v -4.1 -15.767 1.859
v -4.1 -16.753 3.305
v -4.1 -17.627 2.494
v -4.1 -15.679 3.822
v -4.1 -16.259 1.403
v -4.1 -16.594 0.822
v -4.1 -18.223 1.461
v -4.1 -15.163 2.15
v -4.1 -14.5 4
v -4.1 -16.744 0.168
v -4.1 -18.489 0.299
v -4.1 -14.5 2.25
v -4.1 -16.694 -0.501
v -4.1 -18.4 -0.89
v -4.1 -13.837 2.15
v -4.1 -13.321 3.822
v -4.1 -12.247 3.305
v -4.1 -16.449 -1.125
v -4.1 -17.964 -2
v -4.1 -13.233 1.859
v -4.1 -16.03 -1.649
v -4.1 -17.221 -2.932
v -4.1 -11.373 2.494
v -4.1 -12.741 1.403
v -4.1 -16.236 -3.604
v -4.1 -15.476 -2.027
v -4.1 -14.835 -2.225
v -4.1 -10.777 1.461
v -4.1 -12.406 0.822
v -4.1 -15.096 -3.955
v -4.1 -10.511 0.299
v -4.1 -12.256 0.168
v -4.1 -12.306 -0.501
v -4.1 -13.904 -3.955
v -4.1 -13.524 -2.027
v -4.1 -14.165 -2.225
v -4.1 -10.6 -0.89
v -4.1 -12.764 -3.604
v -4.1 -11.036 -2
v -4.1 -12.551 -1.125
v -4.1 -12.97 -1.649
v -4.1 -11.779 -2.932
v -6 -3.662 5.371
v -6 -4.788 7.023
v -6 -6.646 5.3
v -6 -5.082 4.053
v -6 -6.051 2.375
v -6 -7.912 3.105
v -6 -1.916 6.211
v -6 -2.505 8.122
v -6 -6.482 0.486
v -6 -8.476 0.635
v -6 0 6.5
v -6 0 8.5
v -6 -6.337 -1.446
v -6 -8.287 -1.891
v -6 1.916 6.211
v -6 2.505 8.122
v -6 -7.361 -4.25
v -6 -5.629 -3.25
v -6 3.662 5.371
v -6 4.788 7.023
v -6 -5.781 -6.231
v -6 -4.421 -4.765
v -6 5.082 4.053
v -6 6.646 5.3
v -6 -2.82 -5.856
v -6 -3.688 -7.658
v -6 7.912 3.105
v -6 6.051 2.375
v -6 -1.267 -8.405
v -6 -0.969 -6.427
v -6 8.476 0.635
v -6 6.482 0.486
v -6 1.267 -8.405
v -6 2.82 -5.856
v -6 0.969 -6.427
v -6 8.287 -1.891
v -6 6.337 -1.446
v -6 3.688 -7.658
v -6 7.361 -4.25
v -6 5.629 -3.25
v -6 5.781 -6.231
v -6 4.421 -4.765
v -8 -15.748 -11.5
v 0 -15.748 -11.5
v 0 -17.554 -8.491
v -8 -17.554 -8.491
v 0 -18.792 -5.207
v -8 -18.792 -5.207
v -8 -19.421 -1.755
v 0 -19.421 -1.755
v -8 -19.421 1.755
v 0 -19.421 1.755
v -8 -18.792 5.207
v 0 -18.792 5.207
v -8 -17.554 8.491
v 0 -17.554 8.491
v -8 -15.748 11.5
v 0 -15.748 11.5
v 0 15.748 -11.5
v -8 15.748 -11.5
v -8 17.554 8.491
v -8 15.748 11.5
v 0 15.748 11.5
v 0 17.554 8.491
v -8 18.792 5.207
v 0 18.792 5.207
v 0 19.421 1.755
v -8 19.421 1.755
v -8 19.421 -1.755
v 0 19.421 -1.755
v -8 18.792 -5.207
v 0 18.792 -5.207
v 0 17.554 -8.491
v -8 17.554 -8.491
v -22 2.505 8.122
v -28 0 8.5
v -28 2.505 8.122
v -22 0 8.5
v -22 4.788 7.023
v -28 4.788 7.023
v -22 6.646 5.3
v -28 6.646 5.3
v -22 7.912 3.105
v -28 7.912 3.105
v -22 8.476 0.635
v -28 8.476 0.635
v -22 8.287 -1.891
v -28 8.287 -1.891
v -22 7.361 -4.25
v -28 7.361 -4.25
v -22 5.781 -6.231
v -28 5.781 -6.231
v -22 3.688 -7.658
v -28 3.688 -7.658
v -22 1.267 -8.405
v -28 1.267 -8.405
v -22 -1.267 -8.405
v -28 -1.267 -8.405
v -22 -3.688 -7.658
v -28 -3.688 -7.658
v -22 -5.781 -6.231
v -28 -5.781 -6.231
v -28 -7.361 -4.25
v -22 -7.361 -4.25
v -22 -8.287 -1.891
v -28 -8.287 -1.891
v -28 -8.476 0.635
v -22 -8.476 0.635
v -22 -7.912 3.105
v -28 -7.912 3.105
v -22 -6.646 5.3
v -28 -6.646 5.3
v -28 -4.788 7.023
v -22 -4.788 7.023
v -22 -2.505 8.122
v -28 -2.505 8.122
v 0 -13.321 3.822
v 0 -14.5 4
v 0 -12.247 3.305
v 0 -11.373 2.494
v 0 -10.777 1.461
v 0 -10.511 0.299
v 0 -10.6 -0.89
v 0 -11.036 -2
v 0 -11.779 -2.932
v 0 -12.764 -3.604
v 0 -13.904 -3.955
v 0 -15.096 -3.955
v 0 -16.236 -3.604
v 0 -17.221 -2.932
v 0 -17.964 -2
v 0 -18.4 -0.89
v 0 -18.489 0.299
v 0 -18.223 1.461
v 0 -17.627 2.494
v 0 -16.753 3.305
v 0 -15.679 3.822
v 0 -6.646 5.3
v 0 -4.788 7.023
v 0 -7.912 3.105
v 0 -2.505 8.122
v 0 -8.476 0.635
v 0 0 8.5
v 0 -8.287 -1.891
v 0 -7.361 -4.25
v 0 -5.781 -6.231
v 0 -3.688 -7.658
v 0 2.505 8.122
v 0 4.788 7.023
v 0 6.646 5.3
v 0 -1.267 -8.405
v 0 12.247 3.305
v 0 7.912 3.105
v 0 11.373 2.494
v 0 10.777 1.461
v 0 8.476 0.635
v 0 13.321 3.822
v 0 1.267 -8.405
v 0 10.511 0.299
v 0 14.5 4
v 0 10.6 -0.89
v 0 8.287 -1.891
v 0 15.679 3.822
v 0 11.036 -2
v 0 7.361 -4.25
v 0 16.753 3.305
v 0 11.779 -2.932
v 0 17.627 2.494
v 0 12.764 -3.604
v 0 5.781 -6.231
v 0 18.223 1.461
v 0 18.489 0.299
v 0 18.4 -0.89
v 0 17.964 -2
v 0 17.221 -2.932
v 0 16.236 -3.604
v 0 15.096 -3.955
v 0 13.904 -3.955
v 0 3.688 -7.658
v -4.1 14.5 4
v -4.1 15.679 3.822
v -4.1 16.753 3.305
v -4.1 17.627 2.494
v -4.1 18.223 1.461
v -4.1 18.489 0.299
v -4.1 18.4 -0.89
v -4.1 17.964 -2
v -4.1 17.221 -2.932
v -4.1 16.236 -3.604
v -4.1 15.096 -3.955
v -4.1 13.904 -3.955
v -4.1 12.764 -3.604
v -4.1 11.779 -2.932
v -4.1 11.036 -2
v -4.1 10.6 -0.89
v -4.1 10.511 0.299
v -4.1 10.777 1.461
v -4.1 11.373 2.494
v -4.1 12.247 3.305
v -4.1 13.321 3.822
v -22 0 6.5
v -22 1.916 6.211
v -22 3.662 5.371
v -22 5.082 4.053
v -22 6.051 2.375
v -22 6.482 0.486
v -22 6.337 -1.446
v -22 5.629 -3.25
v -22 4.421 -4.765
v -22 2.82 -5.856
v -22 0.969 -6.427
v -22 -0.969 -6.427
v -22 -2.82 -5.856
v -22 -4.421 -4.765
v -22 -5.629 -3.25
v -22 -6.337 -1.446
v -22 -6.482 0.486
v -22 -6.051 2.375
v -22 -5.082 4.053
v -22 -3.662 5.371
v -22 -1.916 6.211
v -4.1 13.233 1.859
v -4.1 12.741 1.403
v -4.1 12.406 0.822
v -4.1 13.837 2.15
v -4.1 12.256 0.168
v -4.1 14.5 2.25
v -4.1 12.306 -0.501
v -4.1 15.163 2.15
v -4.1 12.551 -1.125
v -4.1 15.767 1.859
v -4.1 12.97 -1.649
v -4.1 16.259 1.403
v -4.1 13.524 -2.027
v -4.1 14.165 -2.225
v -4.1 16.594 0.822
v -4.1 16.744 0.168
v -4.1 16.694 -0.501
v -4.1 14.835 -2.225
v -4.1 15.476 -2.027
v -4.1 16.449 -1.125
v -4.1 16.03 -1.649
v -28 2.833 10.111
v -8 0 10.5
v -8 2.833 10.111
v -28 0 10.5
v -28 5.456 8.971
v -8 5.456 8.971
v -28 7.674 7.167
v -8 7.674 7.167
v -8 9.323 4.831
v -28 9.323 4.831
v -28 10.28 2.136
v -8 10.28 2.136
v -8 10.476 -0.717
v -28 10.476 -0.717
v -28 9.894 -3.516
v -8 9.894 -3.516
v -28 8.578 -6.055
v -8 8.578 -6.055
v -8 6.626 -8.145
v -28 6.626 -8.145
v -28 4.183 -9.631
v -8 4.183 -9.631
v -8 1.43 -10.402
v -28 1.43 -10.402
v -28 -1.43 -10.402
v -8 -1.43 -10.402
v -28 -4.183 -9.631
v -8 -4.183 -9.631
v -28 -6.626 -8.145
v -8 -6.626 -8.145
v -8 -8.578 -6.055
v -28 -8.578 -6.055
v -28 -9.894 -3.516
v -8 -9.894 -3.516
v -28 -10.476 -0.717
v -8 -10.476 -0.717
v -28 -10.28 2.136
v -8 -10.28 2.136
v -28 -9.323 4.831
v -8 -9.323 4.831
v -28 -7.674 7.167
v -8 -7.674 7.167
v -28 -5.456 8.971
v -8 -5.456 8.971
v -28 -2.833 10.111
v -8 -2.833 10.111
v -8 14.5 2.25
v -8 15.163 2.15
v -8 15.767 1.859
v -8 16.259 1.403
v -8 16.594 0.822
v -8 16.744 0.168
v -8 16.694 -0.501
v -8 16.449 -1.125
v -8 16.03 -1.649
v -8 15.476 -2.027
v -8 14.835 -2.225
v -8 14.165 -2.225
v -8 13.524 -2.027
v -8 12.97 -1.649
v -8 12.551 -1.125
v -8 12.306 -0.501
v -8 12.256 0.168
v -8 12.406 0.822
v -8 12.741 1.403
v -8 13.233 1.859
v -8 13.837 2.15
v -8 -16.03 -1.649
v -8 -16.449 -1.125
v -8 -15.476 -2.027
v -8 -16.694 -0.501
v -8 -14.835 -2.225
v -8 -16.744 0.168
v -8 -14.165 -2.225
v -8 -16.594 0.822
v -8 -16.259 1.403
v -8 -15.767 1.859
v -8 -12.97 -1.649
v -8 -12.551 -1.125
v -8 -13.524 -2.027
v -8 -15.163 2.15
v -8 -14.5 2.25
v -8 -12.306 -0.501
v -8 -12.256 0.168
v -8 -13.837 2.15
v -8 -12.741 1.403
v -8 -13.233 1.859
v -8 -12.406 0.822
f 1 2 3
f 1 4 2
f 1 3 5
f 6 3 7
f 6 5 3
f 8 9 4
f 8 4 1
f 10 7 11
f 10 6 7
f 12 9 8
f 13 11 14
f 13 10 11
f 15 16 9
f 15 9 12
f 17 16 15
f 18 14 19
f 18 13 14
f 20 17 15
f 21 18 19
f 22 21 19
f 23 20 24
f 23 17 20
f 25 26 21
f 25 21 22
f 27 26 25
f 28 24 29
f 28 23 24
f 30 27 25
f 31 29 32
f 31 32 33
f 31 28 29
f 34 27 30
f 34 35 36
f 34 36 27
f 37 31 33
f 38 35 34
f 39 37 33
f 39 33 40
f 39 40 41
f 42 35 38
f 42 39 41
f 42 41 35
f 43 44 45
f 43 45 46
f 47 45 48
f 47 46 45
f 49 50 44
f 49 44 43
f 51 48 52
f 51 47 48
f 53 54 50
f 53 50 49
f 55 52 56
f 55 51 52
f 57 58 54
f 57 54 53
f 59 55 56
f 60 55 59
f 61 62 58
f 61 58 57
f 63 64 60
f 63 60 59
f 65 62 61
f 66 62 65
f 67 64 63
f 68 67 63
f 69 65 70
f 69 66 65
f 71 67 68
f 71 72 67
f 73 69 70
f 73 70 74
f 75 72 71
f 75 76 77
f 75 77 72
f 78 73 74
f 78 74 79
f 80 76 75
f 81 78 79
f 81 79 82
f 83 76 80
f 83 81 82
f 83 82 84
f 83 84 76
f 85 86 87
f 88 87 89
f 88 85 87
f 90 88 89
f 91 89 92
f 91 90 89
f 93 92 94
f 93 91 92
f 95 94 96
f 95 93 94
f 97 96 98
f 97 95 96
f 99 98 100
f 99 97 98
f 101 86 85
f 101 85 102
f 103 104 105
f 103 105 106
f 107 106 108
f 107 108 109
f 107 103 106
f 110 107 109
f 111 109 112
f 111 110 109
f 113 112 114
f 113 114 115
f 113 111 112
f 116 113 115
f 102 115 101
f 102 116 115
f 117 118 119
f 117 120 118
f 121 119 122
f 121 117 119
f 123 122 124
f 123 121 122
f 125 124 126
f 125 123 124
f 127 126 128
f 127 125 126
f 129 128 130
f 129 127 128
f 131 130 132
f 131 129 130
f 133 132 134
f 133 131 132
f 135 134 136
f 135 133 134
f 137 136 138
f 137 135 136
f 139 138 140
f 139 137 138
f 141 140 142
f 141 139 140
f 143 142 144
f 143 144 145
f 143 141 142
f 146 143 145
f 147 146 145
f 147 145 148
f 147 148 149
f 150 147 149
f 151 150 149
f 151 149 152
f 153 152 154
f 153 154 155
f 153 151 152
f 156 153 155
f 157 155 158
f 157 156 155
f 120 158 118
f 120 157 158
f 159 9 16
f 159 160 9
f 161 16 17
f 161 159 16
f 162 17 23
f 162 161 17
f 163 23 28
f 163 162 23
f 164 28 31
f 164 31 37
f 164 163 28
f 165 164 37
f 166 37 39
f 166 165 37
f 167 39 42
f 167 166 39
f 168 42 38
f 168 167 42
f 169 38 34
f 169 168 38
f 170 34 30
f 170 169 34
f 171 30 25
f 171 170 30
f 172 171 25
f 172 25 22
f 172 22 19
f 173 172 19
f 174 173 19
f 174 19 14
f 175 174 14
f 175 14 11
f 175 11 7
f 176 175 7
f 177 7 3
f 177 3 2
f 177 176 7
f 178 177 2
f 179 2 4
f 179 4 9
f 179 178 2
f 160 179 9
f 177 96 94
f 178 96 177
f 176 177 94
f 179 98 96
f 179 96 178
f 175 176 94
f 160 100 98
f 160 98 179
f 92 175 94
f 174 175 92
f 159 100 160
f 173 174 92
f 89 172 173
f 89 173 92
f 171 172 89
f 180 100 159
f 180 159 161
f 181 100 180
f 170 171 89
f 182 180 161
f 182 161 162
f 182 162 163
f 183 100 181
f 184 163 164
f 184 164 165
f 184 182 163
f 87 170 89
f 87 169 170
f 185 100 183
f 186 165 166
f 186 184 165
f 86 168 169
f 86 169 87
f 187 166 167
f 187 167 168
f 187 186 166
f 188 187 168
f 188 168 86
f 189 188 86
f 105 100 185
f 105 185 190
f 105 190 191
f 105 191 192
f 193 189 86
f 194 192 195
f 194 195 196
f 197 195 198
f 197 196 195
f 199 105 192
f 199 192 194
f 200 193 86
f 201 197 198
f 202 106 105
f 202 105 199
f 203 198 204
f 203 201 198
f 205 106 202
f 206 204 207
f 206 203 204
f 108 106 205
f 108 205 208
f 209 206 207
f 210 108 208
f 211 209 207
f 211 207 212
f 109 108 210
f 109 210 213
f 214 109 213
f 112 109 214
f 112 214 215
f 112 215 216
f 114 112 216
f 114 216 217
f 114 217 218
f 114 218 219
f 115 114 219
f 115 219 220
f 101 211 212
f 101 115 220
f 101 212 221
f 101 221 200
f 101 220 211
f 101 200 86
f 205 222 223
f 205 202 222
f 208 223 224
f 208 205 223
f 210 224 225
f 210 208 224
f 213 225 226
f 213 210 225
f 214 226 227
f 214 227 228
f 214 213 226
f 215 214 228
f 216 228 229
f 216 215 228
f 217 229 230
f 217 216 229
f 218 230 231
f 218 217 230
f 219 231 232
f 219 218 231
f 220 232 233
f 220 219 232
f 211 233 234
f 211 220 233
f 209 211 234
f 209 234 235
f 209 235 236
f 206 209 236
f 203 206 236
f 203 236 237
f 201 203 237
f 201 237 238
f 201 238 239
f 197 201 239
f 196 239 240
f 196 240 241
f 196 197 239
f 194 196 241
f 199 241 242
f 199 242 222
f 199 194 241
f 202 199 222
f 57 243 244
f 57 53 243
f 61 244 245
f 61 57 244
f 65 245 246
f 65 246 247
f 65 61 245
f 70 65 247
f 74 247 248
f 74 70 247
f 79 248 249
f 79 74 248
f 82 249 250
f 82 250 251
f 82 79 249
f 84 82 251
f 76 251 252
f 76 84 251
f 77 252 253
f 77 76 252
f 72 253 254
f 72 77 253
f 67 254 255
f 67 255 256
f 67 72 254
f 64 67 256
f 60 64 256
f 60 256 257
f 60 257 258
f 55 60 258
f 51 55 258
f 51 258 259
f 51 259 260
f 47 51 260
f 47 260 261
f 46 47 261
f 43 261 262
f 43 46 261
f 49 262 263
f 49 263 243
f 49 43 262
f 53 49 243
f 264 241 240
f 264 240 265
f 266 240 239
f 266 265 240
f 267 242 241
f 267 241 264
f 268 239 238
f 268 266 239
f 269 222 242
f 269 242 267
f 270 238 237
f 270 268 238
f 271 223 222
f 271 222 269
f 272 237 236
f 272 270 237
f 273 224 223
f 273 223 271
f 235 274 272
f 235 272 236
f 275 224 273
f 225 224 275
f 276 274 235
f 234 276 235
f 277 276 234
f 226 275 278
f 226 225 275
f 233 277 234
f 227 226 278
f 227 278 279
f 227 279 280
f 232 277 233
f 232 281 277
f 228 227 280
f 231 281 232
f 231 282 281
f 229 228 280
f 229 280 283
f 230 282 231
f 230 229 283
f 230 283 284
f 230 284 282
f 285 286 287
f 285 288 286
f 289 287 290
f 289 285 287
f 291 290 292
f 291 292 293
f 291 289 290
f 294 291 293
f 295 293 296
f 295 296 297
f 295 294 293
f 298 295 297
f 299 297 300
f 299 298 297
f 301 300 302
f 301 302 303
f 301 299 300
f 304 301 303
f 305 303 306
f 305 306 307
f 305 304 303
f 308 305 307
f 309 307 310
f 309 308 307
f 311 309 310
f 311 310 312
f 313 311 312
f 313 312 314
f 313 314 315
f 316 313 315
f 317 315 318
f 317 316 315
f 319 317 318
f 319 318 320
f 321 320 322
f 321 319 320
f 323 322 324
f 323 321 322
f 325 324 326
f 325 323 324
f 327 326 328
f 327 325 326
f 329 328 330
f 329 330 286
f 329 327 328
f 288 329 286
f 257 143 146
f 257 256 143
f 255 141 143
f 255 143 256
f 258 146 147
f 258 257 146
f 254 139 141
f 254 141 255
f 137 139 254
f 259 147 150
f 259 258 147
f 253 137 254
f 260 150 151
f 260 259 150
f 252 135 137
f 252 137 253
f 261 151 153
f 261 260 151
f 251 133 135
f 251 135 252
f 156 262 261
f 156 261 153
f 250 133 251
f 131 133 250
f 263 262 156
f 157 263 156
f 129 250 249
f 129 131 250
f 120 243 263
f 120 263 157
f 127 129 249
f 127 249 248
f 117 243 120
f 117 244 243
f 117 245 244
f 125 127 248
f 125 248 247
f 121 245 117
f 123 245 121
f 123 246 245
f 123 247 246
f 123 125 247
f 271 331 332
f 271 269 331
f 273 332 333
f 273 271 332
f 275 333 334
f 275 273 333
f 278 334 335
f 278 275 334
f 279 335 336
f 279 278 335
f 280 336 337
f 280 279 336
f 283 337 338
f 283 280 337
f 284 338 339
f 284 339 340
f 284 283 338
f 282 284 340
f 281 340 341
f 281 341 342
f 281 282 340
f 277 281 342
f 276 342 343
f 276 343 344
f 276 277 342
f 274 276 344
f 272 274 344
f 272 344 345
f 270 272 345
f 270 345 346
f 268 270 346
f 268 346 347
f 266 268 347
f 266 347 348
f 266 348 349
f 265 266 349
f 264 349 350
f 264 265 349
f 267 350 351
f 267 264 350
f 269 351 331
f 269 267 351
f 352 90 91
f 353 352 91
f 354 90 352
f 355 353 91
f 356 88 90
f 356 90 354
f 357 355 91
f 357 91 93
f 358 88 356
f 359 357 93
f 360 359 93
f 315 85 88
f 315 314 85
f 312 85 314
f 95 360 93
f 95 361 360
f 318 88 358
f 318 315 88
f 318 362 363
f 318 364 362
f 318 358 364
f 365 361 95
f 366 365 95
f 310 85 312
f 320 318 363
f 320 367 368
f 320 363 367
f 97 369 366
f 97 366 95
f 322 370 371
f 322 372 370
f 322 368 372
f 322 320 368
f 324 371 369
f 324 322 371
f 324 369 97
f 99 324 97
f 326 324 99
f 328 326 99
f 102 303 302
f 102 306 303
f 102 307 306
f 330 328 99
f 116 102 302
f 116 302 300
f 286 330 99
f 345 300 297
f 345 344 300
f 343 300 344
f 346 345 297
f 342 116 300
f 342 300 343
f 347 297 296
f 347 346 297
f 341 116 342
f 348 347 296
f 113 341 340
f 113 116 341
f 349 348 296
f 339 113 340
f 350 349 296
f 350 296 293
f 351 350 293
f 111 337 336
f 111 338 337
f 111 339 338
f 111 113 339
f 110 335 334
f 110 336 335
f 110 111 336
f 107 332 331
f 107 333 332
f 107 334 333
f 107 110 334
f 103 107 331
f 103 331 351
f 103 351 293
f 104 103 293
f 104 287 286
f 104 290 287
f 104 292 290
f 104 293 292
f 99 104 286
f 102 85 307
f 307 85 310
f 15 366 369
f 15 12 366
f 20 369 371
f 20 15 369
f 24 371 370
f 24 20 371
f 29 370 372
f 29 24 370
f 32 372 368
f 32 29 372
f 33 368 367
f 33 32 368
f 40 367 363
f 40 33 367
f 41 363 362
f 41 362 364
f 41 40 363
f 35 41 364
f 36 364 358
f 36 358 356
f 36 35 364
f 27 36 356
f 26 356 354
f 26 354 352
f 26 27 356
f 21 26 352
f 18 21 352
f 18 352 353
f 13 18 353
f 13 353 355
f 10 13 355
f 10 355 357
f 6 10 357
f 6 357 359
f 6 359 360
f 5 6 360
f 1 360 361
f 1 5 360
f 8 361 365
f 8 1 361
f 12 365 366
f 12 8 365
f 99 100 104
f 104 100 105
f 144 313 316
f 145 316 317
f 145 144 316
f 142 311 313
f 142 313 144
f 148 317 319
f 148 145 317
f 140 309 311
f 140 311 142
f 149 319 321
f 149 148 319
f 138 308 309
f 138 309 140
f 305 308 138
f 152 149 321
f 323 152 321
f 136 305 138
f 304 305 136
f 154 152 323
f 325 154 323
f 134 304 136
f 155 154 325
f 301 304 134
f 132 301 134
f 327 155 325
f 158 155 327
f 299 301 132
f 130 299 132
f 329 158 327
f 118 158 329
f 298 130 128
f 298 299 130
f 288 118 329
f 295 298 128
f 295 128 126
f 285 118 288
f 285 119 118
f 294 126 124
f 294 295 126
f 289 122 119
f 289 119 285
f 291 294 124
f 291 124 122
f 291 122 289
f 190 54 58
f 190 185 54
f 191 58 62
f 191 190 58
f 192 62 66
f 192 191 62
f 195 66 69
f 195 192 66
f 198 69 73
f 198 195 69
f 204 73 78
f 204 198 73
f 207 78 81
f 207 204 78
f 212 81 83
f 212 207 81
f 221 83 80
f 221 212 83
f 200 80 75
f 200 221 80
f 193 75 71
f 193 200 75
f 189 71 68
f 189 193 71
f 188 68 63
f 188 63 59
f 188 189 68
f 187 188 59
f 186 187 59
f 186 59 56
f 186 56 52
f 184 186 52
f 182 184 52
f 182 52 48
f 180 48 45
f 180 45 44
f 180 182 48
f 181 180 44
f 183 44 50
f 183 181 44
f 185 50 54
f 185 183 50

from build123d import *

# Parameters (mm, degrees)
SKETCH_4_R          = 100
SKETCH_4_W          = 23
SKETCH_4_H          = 39
CUT_EXTRUDE_1_DEPTH = 8


with BuildPart() as part:
    # ｽｹｯﾁ1 → 回転1 (revolve)
    with BuildSketch(Plane.XY, mode=Mode.PRIVATE) as revolve_1_sk:
        Polygon((-28, 8.5), (-22, 8.5), (-22, 6.5), (-6, 6.5), (-6, 8.5), (0, 8.5), (0, 19.5), (-8, 19.5), (-8, 10.5), (-28, 10.5), align=None)
    revolve(revolve_1_sk.sketch.rotate(Axis((0, 0, 0), (-1, 0, 0)), 270), axis=Axis((0, 0, 0), (-1, 0, 0)))

    # ｽｹｯﾁ2 → ｶｯﾄ - 回転1 (revolve, cut)
    with BuildSketch(Plane.XY, mode=Mode.PRIVATE) as cut_revolve_1_sk:
        Polygon((-8, 14.5), (-8, 16.75), (-4.1, 16.75), (-4.1, 18.5), (0, 18.5), (0, 14.5), align=None)
    revolve(cut_revolve_1_sk.sketch.rotate(Axis((0, 14.5, 0), (-1, 0, 0)), 270), axis=Axis((0, 14.5, 0), (-1, 0, 0)), mode=Mode.SUBTRACT)

    # ｽｹｯﾁ3 → ｶｯﾄ - 回転2 (revolve, cut)
    with BuildSketch(Plane.XY, mode=Mode.PRIVATE) as cut_revolve_2_sk:
        Polygon((-8, -14.5), (-8, -12.25), (-4.1, -12.25), (-4.1, -10.5), (0, -10.5), (0, -14.5), align=None)
    revolve(cut_revolve_2_sk.sketch.rotate(Axis((0, -14.5, 0), (-1, 0, 0)), 270), axis=Axis((0, -14.5, 0), (-1, 0, 0)), mode=Mode.SUBTRACT)

    # ｽｹｯﾁ4 → ｶｯﾄ - 押し出し1 (cut)
    with BuildSketch(Plane(origin=(0, 0, 0), x_dir=(0, 0, -1), z_dir=(1, 0, 0))):
        Circle(SKETCH_4_R)
        Rectangle(SKETCH_4_W, SKETCH_4_H, mode=Mode.SUBTRACT)
    extrude(amount=-CUT_EXTRUDE_1_DEPTH, mode=Mode.SUBTRACT)


solid = part.part
